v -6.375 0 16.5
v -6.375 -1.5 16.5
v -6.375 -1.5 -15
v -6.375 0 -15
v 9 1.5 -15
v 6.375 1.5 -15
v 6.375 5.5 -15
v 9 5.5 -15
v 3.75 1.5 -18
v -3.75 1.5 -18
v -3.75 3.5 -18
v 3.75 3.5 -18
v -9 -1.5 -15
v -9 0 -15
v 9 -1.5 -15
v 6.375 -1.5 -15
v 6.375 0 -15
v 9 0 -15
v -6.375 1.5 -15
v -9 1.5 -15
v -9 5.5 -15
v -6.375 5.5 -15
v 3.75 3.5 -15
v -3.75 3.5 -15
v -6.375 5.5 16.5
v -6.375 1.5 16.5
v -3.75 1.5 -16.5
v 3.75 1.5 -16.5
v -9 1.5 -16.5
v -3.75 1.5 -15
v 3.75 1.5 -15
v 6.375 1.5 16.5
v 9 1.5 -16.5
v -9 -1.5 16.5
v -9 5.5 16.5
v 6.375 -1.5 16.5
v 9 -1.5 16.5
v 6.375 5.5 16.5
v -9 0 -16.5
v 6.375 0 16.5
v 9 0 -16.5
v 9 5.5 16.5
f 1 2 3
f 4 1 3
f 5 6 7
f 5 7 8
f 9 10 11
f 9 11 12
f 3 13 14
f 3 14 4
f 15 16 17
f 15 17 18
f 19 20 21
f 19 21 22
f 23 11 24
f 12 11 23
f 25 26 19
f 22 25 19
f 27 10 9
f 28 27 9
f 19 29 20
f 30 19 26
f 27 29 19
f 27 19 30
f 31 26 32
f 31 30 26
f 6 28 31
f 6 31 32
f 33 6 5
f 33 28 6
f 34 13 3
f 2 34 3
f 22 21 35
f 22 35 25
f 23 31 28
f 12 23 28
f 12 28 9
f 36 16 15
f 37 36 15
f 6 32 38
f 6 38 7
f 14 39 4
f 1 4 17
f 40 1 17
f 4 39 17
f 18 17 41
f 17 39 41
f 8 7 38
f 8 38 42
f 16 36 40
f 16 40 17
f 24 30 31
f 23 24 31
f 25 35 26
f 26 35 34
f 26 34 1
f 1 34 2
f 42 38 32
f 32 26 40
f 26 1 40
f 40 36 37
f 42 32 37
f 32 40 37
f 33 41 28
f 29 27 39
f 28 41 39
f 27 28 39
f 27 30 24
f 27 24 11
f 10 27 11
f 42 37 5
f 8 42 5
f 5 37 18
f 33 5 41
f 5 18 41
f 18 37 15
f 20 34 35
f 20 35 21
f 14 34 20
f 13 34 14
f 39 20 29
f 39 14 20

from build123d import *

# Parameters (mm, degrees)
SKETCH1_W                = 2.625
SKETCH1_H                = 31.5
SKETCH1_W_2              = 7.5
SKETCH1_H_2              = 1.5
BOSS_EXTRUDE1_DEPTH      = 1.5
BOSS_EXTRUDE2_START      = 1.5
SKETCH1_3_W              = 7.5
SKETCH1_3_H              = 3
BOSS_EXTRUDE2_DEPTH      = 2
BOSS_EXTRUDE3_DEPTH      = 4
BOSS_EXTRUDE3_DEPTH_BACK = 3
BOSS_EXTRUDE3_START      = 1.5
SKETCH1_4_W              = 2.625
SKETCH1_4_H              = 31.5


with BuildPart() as part:
    # Sketch1 → Boss-Extrude1 (new body)
    with BuildSketch(Plane(origin=(0, 0, 0), x_dir=(1, 0, 0), z_dir=(0, 1, 0))):
        Polygon((-6.375, 15), (-6.375, -16.5), (6.375, -16.5), (6.375, 15), (9, 15), (9, 16.5), (3.75, 16.5), (3.75, 15), (-3.75, 15), (-3.75, 16.5), (-9, 16.5), (-9, 15), align=None)
        with Locations((-7.6875, -0.75)):
            Rectangle(SKETCH1_W, SKETCH1_H)
        with Locations((7.6875, -0.75)):
            Rectangle(SKETCH1_W, SKETCH1_H)
        with Locations((0, 15.75)):
            Rectangle(SKETCH1_W_2, SKETCH1_H_2)
    extrude(amount=BOSS_EXTRUDE1_DEPTH)

    # Sketch1<3> → Boss-Extrude2 (add)
    with BuildSketch(Plane(origin=(0, 0, 0), x_dir=(1, 0, 0), z_dir=(0, 1, 0)).offset(BOSS_EXTRUDE2_START)):
        with Locations((0, 16.5)):
            Rectangle(SKETCH1_3_W, SKETCH1_3_H)
    extrude(amount=BOSS_EXTRUDE2_DEPTH)

    # Sketch1<4> → Boss-Extrude3 (add, two sides: drawn at the far end of the back side and taken through both)
    with BuildSketch(Plane(origin=(0, 0, 0), x_dir=(1, 0, 0), z_dir=(0, 1, 0)).offset(BOSS_EXTRUDE3_START - BOSS_EXTRUDE3_DEPTH_BACK)):
        with Locations((-7.6875, -0.75)):
            Rectangle(SKETCH1_4_W, SKETCH1_4_H)
        with Locations((7.6875, -0.75)):
            Rectangle(SKETCH1_4_W, SKETCH1_4_H)
    extrude(amount=BOSS_EXTRUDE3_DEPTH + BOSS_EXTRUDE3_DEPTH_BACK)


solid = part.part
